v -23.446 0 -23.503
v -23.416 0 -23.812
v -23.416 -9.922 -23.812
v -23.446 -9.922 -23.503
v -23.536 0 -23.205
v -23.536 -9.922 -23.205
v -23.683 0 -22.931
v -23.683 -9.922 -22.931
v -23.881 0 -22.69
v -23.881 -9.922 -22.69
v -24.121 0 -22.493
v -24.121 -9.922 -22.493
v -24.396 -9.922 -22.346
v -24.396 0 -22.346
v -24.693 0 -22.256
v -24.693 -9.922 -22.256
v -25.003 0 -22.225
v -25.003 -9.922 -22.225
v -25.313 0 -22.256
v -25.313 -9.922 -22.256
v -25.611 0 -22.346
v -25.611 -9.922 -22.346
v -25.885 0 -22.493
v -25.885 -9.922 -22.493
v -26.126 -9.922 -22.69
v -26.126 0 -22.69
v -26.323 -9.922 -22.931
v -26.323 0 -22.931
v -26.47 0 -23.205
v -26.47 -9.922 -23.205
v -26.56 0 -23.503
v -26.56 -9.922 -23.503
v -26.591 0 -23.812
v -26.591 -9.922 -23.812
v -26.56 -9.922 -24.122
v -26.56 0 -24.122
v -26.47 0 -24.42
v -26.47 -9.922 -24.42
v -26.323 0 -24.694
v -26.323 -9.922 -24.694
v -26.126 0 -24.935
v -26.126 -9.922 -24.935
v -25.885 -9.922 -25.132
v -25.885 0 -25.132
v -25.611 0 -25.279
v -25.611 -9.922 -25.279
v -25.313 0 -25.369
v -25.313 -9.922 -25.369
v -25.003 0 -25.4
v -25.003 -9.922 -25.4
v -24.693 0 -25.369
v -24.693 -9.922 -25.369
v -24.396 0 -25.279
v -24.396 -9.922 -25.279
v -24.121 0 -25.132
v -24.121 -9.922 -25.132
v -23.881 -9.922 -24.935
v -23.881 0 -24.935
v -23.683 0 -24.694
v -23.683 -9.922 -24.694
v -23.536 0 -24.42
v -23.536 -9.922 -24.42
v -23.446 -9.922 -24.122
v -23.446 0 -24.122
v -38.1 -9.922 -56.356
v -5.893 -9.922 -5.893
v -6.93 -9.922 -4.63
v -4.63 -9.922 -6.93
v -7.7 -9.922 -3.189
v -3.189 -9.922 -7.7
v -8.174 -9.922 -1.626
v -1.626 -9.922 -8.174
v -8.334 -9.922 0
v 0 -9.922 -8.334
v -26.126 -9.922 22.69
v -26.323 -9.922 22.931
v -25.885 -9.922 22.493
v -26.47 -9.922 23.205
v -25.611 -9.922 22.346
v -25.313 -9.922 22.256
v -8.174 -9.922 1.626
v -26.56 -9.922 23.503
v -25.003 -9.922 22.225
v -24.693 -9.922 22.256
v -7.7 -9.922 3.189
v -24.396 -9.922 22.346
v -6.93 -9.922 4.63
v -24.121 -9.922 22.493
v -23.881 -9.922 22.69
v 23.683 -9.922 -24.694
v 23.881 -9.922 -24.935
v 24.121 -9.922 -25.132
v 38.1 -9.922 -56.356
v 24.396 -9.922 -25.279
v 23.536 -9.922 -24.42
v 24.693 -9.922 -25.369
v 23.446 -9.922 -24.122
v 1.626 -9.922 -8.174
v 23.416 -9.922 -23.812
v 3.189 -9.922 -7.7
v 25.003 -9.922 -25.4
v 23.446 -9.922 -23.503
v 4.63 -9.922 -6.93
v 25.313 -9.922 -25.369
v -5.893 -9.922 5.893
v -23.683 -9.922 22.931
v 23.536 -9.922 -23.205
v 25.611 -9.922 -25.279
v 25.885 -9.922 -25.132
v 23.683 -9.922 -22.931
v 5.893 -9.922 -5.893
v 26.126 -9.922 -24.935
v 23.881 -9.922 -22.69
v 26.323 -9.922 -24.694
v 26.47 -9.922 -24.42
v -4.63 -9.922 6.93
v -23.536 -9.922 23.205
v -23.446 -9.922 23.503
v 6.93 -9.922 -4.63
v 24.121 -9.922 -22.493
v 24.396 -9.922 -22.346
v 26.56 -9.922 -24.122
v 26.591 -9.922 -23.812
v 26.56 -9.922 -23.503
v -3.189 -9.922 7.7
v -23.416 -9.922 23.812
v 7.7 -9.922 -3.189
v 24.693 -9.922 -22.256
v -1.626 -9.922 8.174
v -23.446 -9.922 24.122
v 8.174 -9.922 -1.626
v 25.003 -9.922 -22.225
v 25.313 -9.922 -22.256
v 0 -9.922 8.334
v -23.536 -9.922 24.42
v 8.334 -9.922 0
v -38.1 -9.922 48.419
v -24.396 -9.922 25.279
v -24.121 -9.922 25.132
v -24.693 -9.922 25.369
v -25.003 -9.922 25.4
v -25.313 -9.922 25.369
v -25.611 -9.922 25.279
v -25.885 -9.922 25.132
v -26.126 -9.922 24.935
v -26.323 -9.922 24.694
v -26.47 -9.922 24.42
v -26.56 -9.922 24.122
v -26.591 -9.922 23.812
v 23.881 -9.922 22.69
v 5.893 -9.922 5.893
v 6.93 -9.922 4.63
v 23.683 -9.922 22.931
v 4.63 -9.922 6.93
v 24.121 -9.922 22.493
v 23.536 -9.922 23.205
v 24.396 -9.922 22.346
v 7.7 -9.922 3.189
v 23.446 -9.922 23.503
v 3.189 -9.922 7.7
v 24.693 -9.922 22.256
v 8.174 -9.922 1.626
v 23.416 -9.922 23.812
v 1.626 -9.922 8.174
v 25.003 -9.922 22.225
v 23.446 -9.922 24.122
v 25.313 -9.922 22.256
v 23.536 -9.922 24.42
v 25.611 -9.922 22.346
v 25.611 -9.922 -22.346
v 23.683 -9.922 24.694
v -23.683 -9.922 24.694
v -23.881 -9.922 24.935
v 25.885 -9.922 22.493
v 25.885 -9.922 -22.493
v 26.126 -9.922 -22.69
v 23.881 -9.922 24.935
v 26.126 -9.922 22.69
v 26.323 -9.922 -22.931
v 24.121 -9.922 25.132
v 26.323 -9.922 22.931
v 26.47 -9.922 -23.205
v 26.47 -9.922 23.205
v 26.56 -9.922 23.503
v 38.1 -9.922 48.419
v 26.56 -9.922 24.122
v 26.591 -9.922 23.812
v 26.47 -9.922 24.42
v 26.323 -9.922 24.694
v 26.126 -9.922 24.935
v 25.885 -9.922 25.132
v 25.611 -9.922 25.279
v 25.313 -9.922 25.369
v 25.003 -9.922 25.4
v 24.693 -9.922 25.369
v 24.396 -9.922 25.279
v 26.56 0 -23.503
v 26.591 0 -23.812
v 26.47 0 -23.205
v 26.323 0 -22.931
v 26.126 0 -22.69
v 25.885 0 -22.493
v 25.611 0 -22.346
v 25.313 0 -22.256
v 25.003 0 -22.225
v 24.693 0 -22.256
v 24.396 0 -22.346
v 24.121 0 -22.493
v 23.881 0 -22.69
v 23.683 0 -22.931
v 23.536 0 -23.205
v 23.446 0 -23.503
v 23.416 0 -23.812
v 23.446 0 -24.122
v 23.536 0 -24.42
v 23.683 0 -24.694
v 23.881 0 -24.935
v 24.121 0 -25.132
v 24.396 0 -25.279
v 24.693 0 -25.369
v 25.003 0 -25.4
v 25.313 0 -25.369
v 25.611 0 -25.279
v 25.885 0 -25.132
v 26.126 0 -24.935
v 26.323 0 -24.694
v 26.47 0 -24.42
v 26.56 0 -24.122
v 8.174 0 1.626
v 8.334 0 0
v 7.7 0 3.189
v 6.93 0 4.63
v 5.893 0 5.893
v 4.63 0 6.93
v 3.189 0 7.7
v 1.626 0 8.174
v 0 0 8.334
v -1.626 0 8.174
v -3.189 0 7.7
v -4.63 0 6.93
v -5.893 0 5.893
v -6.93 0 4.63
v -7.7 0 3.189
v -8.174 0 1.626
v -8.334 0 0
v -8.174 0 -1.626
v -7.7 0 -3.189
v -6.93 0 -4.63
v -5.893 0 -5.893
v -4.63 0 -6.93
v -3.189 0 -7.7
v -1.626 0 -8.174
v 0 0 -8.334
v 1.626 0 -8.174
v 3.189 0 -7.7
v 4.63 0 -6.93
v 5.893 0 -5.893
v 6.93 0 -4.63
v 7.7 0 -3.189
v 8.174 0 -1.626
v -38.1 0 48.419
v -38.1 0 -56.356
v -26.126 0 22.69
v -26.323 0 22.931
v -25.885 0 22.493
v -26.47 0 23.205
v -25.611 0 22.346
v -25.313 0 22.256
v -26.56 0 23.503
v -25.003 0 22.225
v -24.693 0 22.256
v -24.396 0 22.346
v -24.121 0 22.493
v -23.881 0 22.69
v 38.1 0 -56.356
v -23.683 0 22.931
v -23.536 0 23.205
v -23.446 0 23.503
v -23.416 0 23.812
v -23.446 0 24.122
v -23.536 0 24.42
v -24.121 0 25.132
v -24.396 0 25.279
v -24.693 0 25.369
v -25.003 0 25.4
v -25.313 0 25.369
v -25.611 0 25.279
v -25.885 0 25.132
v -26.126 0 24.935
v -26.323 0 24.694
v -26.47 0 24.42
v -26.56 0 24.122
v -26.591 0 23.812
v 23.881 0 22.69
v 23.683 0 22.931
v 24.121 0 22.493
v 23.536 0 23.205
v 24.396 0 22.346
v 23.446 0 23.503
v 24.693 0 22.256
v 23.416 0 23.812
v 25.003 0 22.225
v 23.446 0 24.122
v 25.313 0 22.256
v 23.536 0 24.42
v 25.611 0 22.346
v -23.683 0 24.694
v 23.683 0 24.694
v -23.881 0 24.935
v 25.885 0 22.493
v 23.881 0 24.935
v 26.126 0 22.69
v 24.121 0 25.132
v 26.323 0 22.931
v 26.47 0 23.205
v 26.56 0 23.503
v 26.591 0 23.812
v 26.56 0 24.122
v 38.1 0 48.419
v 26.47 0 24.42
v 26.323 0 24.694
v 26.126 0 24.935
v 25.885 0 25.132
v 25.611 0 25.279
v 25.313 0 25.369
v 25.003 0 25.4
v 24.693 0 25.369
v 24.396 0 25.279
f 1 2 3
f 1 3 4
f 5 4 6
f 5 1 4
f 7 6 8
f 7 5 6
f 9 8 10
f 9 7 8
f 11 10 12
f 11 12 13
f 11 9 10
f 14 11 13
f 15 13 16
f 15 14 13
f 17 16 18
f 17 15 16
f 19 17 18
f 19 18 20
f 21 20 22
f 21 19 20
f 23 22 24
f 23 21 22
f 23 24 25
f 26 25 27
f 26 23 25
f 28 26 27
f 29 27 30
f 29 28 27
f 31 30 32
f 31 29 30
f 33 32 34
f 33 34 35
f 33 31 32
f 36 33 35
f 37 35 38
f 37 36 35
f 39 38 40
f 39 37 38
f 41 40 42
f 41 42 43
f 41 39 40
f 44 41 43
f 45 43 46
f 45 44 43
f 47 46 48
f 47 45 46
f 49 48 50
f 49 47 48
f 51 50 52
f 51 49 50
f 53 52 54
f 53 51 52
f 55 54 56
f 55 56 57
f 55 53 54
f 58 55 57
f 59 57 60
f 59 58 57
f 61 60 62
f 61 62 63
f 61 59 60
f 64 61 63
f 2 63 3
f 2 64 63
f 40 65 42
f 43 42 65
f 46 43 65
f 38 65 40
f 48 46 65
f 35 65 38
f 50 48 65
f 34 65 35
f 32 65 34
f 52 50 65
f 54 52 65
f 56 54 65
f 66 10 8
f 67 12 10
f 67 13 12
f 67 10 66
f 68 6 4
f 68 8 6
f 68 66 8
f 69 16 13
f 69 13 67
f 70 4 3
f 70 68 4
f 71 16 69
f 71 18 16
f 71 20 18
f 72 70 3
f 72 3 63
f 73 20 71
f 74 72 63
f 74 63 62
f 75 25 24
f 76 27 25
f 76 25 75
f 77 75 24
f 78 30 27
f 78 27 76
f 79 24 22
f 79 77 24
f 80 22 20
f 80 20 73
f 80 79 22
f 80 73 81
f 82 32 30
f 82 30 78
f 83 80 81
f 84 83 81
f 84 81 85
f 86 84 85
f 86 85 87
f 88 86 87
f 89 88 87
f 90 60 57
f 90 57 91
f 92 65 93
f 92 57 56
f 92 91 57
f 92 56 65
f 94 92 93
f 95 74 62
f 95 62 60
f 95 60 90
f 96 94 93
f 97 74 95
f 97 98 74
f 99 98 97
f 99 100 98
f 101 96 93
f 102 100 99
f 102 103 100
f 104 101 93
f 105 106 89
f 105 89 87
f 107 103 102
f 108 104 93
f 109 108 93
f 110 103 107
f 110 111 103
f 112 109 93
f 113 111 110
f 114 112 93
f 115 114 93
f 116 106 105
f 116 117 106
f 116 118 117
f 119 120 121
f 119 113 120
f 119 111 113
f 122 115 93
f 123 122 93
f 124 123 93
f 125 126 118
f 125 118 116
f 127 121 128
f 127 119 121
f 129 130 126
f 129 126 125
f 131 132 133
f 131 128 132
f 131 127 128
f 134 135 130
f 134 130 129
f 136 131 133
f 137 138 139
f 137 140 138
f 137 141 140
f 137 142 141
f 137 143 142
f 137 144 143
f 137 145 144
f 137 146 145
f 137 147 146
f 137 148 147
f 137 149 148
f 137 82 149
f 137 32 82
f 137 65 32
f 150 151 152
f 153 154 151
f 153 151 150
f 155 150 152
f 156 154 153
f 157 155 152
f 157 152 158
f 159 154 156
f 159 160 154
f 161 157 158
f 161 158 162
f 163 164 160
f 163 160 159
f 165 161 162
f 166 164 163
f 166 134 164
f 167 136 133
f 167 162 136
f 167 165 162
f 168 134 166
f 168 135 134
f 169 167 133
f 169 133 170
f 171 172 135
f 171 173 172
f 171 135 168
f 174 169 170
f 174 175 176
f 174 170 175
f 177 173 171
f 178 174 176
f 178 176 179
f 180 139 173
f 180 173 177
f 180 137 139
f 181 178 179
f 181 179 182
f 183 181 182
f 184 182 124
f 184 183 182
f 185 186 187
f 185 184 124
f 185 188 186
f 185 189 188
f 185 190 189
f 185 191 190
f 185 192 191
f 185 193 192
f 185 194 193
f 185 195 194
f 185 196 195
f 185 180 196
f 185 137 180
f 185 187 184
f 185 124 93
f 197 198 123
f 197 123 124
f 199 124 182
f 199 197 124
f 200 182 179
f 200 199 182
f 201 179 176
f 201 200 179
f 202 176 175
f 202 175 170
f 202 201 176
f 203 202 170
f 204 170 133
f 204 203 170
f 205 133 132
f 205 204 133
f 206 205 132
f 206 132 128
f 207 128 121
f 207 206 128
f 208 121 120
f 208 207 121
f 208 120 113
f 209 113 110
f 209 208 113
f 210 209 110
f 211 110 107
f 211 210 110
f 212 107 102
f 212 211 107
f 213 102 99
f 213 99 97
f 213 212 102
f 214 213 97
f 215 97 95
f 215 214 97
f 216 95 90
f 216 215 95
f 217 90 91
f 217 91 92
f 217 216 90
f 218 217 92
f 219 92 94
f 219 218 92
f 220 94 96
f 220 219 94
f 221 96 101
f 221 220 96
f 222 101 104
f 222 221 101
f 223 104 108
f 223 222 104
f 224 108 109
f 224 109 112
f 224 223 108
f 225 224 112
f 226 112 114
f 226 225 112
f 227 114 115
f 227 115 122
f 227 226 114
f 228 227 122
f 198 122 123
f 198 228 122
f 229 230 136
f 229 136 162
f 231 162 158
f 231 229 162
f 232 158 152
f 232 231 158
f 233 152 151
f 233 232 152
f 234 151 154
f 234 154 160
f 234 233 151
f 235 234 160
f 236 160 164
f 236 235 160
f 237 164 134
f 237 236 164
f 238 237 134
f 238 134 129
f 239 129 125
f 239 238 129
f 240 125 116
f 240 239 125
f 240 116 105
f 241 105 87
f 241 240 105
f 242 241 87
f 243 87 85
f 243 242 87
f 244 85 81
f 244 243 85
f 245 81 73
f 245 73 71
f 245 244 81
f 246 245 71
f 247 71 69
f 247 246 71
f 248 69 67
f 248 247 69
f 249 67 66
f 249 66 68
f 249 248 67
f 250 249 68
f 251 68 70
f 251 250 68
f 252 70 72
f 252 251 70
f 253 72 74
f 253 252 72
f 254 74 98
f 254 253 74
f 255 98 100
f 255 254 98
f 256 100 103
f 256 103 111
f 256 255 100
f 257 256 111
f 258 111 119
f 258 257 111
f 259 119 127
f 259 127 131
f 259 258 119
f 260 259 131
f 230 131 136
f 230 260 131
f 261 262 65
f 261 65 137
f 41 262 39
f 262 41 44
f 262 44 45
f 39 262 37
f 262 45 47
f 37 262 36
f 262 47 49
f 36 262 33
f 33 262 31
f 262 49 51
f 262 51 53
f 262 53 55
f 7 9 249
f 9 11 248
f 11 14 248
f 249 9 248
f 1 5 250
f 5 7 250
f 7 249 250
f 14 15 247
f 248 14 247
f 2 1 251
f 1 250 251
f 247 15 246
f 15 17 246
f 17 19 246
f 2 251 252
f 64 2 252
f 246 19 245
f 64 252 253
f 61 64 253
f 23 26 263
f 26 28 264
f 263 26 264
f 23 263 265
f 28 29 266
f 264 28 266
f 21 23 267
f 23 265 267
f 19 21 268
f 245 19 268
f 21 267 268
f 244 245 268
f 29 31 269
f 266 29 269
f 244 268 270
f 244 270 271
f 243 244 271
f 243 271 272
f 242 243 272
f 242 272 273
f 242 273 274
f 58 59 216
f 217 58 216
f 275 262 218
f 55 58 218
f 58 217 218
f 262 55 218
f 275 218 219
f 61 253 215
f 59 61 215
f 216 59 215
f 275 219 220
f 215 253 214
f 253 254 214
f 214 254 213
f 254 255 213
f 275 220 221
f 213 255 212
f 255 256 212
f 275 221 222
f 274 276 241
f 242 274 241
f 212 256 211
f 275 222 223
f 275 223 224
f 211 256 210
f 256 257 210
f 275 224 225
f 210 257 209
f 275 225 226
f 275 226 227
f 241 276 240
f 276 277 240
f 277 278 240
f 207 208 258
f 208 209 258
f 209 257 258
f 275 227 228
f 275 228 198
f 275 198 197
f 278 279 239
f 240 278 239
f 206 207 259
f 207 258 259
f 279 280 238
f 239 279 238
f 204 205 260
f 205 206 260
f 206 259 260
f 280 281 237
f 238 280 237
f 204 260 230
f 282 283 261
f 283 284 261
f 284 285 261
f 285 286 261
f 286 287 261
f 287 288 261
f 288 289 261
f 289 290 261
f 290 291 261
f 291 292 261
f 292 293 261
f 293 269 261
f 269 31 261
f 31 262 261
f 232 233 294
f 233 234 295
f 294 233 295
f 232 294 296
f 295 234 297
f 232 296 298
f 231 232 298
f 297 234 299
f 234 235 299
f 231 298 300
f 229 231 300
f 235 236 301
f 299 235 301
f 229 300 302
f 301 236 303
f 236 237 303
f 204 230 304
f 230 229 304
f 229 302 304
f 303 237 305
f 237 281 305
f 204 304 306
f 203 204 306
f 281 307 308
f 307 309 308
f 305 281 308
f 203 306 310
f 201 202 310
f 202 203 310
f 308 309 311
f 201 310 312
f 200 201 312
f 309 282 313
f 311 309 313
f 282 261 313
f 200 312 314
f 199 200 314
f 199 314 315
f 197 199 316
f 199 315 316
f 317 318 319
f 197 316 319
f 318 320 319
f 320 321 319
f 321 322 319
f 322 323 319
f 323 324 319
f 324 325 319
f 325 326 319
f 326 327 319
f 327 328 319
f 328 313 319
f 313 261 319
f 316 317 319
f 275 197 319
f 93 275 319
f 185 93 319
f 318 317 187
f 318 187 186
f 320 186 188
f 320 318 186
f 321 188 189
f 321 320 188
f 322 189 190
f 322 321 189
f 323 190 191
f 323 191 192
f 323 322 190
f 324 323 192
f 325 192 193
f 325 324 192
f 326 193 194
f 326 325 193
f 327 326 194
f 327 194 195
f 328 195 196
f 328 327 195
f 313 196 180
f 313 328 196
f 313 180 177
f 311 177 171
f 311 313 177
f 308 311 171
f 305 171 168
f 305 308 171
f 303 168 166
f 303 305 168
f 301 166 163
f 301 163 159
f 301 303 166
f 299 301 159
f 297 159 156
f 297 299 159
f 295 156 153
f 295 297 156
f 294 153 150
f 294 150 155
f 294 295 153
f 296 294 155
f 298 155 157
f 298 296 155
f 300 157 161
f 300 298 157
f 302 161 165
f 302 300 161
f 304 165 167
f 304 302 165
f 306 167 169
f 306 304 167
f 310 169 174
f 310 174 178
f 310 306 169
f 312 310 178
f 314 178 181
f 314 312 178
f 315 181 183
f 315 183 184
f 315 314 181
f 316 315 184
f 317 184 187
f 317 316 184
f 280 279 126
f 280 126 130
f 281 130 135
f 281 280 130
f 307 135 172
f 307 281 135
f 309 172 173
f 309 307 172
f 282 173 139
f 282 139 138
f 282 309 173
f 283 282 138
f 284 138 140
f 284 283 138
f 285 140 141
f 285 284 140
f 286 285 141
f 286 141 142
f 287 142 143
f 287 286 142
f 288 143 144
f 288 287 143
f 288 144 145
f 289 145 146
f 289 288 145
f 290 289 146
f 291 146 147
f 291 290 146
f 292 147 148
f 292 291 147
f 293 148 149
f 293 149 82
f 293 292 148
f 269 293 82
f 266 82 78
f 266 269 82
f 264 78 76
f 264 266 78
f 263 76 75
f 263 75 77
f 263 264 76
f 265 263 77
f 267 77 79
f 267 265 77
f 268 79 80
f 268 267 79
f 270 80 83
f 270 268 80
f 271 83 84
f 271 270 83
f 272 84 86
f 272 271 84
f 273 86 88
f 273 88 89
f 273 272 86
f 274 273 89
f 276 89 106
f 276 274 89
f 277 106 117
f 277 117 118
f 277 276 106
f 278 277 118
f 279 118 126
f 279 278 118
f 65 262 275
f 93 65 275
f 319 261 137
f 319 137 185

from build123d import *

# Parameters (mm, degrees)
F0_W     = 76.2
F0_H     = 104.775
F0_R     = 1.5875
F0_R_2   = 8.334375
F1_DEPTH = 9.921875


# Not quite as in the source:
# - a length typed as a fraction of an inch, garbled in the dataset ("3 / 203.2 mm" for 3/8 in), is restored


with BuildPart() as f1:
    # F0 (on Front) → F1 (new body)
    with BuildSketch(Plane.XZ):
        with Locations((0, -3.96875)):
            Rectangle(F0_W, F0_H)
        with Locations((-25.003125, -23.8125)):
            Circle(F0_R, mode=Mode.SUBTRACT)
        with Locations((25.003125, -23.8125)):
            Circle(F0_R, mode=Mode.SUBTRACT)
        with Locations((-25.003125, 23.8125)):
            Circle(F0_R, mode=Mode.SUBTRACT)
        Circle(F0_R_2, mode=Mode.SUBTRACT)
        with Locations((25.003125, 23.8125)):
            Circle(F0_R, mode=Mode.SUBTRACT)
    extrude(amount=F1_DEPTH)


solid = f1.part
